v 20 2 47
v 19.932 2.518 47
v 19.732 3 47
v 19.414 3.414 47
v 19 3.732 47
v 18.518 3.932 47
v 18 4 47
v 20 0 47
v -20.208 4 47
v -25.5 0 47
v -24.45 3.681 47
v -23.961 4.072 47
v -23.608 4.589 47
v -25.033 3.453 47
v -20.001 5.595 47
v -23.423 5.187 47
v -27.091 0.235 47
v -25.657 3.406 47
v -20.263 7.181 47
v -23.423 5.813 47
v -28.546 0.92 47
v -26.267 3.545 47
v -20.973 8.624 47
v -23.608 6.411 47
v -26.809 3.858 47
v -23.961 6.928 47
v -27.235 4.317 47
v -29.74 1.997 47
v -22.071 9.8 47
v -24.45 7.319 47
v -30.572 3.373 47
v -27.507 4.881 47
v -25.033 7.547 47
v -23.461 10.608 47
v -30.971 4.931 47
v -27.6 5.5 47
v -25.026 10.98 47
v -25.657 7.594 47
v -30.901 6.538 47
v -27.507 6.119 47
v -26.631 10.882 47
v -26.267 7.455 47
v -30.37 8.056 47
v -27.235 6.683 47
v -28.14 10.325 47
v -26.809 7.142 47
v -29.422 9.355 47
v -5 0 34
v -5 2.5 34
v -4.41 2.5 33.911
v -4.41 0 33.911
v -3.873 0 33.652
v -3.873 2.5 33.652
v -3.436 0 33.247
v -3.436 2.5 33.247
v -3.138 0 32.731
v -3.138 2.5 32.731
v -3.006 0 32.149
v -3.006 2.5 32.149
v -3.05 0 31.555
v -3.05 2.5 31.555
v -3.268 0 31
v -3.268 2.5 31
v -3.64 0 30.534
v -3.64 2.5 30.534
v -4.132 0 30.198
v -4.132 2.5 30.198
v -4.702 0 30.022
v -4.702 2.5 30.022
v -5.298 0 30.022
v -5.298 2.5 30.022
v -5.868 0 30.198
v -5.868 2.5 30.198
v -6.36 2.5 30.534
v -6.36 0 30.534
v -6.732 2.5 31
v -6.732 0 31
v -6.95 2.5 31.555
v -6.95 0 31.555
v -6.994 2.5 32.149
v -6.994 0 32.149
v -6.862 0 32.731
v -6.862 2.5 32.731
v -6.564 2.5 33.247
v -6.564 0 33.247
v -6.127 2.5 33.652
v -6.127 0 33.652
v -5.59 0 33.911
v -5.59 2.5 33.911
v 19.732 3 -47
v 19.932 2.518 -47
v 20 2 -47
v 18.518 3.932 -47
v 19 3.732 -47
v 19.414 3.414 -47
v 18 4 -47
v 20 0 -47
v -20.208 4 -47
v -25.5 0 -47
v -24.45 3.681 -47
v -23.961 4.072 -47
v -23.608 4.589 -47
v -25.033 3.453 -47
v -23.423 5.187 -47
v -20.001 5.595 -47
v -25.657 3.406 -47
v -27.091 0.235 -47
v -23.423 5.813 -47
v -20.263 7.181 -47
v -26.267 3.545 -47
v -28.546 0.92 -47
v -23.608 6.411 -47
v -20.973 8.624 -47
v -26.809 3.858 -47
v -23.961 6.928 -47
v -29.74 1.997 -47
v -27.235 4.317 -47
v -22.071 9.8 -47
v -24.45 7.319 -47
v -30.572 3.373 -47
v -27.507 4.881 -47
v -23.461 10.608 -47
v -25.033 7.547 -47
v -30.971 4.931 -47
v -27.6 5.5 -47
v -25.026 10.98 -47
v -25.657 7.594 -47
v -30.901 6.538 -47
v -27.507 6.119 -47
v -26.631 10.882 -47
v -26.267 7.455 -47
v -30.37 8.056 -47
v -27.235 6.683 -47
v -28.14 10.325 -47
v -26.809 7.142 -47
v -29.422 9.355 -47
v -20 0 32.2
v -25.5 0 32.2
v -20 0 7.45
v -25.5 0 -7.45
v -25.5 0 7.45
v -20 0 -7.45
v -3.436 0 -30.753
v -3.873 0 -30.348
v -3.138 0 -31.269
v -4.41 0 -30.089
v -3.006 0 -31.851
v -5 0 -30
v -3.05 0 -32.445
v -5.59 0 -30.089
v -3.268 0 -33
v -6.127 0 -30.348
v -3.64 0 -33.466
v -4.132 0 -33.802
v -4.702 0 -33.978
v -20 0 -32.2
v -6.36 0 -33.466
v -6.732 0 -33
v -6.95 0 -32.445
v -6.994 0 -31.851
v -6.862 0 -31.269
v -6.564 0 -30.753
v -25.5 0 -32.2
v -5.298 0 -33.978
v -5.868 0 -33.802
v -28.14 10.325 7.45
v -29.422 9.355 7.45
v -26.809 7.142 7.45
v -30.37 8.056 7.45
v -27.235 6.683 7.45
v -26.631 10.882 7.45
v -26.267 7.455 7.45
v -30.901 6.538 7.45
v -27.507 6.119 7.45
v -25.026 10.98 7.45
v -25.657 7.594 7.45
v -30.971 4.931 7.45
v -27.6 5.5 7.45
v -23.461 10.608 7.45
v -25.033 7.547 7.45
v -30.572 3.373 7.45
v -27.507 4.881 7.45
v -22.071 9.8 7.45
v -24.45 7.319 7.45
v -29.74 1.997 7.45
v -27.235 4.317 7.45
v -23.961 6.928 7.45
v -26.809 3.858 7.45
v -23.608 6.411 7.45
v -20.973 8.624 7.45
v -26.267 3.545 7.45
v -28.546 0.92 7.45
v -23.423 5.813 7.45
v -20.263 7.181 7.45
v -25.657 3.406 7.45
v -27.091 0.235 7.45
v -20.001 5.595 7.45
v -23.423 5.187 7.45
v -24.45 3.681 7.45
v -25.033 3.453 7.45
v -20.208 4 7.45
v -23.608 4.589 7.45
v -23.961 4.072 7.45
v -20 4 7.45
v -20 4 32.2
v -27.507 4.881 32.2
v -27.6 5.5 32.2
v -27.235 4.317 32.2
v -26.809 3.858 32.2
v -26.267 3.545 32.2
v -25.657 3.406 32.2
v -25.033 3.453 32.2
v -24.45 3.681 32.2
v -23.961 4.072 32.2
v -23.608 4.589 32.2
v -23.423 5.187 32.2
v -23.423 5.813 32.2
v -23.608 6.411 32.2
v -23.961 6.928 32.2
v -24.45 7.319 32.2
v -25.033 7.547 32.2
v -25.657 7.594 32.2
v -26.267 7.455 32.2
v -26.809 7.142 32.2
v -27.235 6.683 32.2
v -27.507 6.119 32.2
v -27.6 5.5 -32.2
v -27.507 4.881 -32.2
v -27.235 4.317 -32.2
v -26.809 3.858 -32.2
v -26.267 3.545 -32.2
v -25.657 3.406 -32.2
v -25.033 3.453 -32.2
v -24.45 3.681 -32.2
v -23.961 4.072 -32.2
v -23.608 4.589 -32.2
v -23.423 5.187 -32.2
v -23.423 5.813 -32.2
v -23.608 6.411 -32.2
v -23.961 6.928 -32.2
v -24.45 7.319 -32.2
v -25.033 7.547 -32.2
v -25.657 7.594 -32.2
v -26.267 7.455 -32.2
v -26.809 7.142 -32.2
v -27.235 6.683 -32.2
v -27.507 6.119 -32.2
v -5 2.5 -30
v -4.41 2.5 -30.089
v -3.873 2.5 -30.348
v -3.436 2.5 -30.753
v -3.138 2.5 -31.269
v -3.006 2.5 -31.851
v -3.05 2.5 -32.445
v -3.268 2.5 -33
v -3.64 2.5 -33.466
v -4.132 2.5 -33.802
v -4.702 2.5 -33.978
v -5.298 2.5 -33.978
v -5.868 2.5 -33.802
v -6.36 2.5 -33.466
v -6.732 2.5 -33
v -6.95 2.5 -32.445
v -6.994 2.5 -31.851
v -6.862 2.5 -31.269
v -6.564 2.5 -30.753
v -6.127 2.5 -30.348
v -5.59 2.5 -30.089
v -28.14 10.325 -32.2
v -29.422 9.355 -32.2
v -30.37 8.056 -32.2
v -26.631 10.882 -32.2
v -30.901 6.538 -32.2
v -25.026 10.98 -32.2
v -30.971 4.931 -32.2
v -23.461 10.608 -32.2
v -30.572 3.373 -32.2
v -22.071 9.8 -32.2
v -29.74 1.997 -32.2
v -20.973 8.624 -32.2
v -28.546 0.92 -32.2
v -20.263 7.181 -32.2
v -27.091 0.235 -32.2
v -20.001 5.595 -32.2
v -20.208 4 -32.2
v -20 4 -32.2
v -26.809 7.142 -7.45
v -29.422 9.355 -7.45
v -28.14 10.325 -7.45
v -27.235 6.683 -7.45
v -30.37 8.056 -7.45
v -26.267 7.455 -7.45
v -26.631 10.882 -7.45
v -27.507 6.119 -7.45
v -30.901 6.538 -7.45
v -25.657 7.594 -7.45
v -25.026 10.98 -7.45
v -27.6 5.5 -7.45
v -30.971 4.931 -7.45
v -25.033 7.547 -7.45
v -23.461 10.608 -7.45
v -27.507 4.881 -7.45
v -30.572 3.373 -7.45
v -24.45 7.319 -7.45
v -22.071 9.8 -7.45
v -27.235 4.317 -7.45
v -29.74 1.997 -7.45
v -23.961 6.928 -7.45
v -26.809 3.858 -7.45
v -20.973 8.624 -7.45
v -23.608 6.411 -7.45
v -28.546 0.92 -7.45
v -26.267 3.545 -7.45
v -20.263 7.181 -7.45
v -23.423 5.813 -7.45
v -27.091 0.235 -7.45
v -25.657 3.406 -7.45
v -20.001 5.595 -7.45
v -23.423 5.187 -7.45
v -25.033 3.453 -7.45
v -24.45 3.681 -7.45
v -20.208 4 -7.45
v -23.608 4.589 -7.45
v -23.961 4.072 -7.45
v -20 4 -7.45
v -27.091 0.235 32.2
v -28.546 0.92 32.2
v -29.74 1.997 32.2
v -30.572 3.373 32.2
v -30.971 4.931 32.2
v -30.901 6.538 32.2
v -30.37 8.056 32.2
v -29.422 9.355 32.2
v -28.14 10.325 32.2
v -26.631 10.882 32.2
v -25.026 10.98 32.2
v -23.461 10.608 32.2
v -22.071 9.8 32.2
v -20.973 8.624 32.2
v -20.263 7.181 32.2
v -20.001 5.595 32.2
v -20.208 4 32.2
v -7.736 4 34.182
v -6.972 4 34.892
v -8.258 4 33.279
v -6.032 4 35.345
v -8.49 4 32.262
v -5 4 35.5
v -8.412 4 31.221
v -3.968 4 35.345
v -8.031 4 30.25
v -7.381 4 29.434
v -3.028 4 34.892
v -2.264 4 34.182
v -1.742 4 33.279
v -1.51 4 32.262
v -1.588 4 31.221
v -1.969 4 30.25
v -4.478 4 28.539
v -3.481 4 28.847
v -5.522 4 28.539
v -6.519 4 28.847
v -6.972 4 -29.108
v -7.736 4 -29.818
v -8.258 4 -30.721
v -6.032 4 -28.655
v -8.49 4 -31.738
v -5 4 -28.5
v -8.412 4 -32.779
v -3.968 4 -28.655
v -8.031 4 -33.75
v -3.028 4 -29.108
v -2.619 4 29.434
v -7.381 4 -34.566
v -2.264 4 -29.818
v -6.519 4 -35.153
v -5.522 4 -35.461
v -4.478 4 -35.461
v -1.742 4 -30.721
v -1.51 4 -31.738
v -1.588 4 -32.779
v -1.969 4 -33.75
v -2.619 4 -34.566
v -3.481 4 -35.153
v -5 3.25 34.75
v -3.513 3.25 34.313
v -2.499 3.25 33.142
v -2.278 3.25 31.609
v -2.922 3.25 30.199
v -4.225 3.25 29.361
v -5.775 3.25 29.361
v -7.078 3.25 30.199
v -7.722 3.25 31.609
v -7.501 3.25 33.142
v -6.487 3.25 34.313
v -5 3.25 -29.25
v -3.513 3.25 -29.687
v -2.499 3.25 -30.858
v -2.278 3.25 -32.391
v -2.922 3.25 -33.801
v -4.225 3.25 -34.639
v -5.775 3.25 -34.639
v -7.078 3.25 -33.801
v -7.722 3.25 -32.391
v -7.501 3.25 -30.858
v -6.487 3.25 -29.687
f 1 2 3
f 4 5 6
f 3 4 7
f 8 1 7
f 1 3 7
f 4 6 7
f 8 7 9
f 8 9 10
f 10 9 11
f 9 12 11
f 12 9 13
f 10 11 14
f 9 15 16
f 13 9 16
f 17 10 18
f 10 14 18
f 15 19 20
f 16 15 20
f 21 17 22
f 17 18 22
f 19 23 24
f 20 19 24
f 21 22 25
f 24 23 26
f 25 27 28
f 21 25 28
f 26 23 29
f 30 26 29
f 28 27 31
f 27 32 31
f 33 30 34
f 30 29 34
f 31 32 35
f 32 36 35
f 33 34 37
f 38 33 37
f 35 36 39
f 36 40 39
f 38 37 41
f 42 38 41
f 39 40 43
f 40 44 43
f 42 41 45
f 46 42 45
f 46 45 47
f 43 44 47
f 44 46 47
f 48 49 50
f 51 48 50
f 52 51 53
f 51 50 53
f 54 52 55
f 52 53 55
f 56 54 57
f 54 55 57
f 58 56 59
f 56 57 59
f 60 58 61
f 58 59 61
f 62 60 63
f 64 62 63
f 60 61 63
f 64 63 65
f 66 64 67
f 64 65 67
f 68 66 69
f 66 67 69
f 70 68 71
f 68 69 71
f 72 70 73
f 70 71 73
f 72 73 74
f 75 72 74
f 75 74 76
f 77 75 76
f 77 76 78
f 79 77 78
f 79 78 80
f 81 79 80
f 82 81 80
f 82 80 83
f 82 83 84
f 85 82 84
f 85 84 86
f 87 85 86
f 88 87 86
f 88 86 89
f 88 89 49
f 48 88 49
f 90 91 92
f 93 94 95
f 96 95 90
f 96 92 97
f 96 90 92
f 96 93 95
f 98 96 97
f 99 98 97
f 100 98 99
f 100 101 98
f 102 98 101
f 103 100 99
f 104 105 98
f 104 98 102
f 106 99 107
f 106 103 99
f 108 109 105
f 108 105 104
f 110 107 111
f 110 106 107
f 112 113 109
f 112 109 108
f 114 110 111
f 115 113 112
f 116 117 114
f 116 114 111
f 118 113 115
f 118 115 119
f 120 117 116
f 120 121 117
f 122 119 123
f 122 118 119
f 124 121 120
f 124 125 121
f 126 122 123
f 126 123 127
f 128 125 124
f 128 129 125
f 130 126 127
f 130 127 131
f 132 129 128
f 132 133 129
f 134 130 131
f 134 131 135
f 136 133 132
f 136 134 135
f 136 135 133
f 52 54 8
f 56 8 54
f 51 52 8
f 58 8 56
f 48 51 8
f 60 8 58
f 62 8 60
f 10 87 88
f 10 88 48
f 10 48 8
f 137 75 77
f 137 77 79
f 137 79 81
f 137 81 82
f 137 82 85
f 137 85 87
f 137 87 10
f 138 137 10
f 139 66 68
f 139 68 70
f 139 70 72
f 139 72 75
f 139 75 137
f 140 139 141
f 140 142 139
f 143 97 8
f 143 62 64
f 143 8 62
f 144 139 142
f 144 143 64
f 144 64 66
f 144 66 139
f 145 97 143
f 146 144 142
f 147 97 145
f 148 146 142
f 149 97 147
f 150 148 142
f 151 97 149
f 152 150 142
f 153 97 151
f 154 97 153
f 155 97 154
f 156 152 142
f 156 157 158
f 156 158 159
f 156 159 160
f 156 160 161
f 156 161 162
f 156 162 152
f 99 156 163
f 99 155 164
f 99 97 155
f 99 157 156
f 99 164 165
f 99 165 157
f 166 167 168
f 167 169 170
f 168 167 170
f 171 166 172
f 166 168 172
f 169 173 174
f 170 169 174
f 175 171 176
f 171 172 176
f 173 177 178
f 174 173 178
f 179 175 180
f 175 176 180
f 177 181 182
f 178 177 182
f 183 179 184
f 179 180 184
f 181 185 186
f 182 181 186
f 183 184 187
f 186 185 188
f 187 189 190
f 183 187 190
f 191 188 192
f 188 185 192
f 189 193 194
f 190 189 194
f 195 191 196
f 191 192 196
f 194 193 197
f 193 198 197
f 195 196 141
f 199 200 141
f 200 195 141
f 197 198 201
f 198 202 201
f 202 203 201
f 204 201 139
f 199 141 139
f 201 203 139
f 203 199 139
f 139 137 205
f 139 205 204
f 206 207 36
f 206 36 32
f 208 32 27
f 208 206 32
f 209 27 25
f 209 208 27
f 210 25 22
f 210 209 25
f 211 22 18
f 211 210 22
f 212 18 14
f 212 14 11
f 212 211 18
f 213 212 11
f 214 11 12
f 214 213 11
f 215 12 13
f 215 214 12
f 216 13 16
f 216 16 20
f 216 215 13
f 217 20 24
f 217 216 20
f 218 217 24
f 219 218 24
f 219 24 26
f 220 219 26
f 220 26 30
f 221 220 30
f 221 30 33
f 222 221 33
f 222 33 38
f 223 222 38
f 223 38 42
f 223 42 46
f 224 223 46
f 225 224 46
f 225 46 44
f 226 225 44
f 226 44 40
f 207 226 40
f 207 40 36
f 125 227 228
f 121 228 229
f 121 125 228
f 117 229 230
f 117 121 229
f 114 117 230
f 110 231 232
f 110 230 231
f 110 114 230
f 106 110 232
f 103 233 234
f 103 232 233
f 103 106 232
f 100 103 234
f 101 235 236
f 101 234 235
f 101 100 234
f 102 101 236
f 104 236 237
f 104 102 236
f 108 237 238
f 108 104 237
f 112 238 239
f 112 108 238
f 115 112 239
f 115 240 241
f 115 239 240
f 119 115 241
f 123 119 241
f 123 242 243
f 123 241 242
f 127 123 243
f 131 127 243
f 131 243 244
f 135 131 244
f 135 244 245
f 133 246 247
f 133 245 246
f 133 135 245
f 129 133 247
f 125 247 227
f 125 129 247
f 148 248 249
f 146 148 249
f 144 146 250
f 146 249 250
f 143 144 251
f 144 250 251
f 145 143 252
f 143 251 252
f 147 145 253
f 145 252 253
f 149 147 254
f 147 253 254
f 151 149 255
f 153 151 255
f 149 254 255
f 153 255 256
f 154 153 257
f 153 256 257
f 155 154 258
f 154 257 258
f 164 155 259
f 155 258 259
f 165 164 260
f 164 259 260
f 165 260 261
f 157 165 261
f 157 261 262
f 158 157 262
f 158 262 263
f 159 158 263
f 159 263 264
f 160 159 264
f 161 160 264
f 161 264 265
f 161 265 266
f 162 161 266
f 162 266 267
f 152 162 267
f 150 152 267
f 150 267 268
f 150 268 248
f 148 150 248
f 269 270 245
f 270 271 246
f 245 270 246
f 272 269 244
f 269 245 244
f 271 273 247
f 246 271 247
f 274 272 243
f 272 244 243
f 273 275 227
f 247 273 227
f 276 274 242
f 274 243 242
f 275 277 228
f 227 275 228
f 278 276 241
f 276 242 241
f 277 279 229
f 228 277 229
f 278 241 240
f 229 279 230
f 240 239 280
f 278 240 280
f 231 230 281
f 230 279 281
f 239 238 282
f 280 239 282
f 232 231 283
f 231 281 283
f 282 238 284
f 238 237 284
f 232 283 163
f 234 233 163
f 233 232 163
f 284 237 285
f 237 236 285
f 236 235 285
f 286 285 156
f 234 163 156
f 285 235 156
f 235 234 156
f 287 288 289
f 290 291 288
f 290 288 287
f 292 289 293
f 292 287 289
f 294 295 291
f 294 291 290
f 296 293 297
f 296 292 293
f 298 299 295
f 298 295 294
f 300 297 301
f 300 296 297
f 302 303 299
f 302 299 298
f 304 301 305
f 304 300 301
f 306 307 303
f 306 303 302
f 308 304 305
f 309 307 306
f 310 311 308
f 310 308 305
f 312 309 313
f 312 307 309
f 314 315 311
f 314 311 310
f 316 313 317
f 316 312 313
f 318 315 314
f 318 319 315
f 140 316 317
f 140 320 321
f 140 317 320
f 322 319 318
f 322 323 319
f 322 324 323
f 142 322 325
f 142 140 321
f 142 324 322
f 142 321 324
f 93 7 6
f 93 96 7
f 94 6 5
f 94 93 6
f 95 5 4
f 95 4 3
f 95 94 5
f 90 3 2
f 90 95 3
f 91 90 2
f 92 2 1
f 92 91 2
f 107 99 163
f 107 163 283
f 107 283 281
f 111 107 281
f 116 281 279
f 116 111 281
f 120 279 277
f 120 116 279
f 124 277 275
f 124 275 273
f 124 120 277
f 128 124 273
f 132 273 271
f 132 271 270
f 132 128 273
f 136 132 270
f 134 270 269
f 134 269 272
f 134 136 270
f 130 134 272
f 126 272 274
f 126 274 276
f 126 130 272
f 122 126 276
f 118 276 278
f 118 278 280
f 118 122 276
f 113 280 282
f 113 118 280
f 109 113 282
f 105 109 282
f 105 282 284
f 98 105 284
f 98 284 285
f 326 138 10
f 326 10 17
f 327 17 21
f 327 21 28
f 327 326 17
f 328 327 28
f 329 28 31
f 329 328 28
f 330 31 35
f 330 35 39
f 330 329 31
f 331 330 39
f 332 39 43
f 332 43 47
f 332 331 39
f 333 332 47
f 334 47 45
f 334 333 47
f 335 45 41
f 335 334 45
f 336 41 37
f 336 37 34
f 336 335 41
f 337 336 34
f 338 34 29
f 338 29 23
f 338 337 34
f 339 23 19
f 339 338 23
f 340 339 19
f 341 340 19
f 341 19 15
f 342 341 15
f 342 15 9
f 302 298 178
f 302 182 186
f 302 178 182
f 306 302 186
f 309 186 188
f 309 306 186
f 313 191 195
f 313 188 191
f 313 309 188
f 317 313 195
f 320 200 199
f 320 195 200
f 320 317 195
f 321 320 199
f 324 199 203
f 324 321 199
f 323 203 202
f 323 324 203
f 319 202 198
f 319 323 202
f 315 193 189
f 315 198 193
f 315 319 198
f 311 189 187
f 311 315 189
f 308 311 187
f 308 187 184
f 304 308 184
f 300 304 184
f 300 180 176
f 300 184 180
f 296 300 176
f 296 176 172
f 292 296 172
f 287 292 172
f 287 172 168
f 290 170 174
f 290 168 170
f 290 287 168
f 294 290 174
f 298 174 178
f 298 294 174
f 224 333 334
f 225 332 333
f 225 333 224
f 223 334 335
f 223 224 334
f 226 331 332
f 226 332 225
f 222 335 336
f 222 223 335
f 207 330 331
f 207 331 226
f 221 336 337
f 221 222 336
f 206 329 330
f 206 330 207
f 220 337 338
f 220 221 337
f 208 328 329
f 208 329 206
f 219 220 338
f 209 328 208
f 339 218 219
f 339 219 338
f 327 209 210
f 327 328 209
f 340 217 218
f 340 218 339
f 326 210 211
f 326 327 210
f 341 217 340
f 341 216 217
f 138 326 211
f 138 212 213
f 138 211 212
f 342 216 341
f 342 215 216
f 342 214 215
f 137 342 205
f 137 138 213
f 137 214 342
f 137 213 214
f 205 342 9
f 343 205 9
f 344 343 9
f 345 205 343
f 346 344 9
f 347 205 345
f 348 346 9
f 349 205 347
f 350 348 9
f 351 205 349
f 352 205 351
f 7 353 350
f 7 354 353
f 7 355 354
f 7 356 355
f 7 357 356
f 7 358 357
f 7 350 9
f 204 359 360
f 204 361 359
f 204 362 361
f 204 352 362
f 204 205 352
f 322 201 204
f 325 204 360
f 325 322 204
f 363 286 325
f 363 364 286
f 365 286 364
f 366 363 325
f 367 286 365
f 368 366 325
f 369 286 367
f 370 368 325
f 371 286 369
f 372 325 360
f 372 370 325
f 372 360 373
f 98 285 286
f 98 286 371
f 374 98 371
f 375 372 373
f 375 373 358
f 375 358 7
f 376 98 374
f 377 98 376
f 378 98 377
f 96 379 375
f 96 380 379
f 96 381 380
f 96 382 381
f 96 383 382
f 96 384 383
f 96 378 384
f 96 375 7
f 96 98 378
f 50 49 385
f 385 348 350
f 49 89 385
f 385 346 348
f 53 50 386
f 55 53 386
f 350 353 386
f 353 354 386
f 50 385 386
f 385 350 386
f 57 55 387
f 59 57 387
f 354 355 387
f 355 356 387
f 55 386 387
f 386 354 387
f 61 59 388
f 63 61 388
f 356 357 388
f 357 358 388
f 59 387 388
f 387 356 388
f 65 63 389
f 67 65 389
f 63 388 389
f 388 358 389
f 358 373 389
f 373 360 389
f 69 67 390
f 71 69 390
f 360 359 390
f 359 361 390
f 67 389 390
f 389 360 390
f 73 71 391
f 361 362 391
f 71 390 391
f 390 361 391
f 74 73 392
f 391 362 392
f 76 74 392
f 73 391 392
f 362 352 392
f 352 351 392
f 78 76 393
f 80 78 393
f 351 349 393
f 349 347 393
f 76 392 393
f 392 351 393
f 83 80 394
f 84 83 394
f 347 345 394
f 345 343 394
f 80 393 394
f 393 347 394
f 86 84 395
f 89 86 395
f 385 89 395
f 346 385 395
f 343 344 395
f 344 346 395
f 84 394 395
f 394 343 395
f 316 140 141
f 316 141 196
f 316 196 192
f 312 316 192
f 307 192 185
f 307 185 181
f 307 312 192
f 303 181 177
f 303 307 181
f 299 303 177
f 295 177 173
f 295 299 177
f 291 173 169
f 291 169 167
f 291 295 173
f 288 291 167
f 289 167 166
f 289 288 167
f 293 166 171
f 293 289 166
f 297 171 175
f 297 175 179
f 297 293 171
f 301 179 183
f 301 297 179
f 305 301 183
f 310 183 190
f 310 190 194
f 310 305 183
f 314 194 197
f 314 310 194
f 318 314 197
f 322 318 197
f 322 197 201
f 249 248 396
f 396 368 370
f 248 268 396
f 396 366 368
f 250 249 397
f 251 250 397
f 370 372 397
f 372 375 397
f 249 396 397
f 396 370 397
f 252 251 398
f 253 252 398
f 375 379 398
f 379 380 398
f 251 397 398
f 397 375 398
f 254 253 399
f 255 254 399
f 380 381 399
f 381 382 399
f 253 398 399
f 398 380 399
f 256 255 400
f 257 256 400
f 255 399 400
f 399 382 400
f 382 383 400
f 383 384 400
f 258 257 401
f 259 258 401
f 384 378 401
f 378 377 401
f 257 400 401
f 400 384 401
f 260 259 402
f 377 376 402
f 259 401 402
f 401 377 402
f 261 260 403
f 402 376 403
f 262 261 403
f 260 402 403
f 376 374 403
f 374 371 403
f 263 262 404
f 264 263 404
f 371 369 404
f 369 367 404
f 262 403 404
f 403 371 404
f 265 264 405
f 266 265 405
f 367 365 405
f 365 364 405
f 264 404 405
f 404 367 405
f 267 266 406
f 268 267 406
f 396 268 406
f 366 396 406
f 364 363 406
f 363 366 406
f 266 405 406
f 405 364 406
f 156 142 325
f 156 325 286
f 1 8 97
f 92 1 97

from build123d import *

# Parameters (mm, degrees)
SKETCH_1_W           = 40
SKETCH_1_H           = 94
EXTRUDE_1_DEPTH      = 4
EXTRUDE_2_DEPTH      = 47
EXTRUDE_2_DEPTH_BACK = 47
SKETCH_2_R           = 2.1
SKETCH_3_W           = 11
SKETCH_3_H           = 24.75
CUT_EXTRUDE_1_DEPTH  = 14
SKETCH_4_R           = 2
CUT_EXTRUDE_2_DEPTH  = 14
CHAMFER_2_SIZE       = 1.5
FILLET_1_R           = 2


with BuildPart() as part:
    # Эскиз1 → Бобышка-Вытянуть1 (new body)
    with BuildSketch(Plane(origin=(0, 0, 0), x_dir=(1, 0, 0), z_dir=(0, 1, 0))):
        Rectangle(SKETCH_1_W, SKETCH_1_H)
    extrude(amount=EXTRUDE_1_DEPTH)

    # Эскиз2 → Бобышка-Вытянуть2 (add, two sides: drawn at the far end of the back side and taken through both)
    with BuildSketch(Plane.XY.offset(-EXTRUDE_2_DEPTH_BACK)):
        with BuildLine():
            Line((-20, 0), (-25.5, 0))
            ThreePointArc((-25.5, 0), (-28.81662479, 9.887482194), (-20.208497378, 4))
            Line((-20.208497378, 4), (-20, 4))
            Line((-20, 4), (-20, 0))
        make_face()
        with Locations(Location((-25.5, 5.5, 0), (0, 0, 180))):
            Circle(SKETCH_2_R, mode=Mode.SUBTRACT)
    extrude(amount=EXTRUDE_2_DEPTH + EXTRUDE_2_DEPTH_BACK)

    # Эскиз3 → Вырез-Вытянуть1 (cut)
    with BuildSketch(Plane(origin=(0, 0, 0), x_dir=(1, 0, 0), z_dir=(0, 1, 0))):
        with Locations((-25.5, 19.825)):
            Rectangle(SKETCH_3_W, SKETCH_3_H)
        with Locations((-25.5, -19.825)):
            Rectangle(SKETCH_3_W, SKETCH_3_H)
    extrude(amount=CUT_EXTRUDE_1_DEPTH, mode=Mode.SUBTRACT)

    # Эскиз4 → Вырез-Вытянуть2 (cut)
    with BuildSketch(Plane(origin=(0, 4, 0), x_dir=(1, 0, 0), z_dir=(0, 1, 0))):
        with Locations(Location((-5, 32, 0), (0, 0, 270))):
            Circle(SKETCH_4_R)
        with Locations(Location((-5, -32, 0), (0, 0, 270))):
            Circle(SKETCH_4_R)
    extrude(amount=-CUT_EXTRUDE_2_DEPTH, mode=Mode.SUBTRACT)

    # Фаска2
    chamfer_2_edges = [part.edges().sort_by_distance(p)[0] for p in [
        (-5, 4, -34),
        (-5, 4, 30),
    ]]
    chamfer(chamfer_2_edges, length=CHAMFER_2_SIZE)

    # Скругление1
    fillet_1_edges = [part.edges().sort_by_distance(p)[0] for p in [
        (20, 4, 0),
    ]]
    fillet(fillet_1_edges, radius=FILLET_1_R)


solid = part.part
